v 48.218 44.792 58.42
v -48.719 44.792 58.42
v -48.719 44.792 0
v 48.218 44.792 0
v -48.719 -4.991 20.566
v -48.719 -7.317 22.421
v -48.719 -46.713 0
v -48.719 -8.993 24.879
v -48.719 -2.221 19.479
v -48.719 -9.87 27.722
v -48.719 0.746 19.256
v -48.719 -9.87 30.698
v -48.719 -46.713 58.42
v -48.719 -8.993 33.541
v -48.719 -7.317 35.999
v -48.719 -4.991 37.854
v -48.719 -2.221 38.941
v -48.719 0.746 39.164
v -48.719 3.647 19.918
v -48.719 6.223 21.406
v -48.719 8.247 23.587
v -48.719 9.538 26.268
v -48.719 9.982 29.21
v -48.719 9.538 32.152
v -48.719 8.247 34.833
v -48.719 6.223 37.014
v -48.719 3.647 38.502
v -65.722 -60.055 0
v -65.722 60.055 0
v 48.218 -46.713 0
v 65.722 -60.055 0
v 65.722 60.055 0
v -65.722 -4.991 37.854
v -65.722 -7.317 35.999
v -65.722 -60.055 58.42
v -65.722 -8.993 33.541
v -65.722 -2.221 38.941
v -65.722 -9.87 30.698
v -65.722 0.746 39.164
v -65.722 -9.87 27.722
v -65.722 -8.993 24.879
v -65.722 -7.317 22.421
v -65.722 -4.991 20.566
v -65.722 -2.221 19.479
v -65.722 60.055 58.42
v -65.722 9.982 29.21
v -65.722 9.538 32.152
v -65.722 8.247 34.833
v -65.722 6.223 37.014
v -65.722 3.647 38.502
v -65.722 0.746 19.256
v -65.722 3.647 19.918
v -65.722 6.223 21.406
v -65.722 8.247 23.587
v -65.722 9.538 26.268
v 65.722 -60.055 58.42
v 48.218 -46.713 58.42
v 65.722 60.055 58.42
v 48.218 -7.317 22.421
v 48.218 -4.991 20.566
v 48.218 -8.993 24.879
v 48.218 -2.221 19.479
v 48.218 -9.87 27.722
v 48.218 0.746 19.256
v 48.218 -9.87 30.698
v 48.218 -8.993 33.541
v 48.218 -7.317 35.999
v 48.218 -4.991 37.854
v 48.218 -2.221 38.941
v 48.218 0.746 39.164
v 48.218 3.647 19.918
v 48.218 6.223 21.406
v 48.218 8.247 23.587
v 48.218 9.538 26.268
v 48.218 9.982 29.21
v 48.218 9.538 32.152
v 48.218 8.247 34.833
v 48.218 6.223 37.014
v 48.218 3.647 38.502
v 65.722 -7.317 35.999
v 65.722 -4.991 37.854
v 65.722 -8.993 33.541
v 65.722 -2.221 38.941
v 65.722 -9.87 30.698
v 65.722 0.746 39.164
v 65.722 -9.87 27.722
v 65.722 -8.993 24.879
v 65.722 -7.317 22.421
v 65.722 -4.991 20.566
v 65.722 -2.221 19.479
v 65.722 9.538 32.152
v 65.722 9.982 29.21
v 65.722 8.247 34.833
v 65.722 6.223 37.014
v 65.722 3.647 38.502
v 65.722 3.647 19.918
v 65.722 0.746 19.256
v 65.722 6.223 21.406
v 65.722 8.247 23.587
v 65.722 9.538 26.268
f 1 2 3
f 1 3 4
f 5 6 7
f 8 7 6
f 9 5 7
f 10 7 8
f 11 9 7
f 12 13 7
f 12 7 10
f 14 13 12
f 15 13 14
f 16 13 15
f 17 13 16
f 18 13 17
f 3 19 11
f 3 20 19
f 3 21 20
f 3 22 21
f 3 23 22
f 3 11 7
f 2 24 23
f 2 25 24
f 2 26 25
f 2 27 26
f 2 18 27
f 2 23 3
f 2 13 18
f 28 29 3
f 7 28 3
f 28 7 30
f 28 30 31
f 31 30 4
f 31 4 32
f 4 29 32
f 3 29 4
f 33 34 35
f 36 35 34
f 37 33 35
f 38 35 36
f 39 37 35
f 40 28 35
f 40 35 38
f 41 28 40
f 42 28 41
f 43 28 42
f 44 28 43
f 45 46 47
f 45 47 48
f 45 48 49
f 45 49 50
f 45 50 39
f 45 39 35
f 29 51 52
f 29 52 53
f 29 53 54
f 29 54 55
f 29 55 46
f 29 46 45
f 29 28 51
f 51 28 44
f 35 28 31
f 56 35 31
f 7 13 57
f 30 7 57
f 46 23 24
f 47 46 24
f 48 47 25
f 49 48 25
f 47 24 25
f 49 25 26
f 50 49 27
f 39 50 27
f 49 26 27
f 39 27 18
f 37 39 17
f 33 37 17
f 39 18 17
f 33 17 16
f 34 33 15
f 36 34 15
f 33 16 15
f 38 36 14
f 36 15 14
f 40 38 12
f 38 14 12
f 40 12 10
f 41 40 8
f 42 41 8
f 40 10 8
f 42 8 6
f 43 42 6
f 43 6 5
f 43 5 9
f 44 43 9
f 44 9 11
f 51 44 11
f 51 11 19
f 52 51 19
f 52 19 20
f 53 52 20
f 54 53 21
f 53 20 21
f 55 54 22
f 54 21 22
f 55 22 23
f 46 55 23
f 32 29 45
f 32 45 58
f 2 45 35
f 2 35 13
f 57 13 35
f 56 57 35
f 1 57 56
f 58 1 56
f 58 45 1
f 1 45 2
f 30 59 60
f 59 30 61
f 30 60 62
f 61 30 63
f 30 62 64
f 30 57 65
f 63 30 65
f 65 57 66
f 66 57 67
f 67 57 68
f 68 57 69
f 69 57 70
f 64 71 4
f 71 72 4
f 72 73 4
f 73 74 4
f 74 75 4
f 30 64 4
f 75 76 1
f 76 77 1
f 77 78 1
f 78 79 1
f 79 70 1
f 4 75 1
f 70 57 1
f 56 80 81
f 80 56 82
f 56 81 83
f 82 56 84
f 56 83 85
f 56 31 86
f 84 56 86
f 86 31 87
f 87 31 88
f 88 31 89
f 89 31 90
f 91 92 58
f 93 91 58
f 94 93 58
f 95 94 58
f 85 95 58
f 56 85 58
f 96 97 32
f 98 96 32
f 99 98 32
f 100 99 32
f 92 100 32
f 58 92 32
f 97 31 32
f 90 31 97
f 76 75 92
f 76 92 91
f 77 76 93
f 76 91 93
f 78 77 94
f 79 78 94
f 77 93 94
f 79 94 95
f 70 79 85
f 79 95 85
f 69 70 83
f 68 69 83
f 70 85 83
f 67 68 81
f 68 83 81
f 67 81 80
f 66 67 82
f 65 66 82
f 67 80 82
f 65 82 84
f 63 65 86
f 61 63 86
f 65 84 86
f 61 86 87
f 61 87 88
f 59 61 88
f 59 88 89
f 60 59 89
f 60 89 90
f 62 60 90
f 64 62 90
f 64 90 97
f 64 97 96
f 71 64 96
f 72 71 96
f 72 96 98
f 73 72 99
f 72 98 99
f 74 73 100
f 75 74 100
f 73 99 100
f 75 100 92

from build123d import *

# Parameters (mm, degrees)
F0_W     = 131.444588
F0_H     = 120.110088
F1_DEPTH = 58.42
F2_R     = 9.981672
F4_DEPTH = 157.226
F5_W     = 96.937245
F5_H     = 91.505859
F6_DEPTH = 129.032


with BuildPart() as f1:
    # F0 (on Top) → F1 (new body)
    with BuildSketch(Plane.XY):
        Rectangle(F0_W, F0_H)
    extrude(amount=F1_DEPTH)

    # F2 (on face) → F4 (cut, symmetric)
    with BuildSketch(Plane.YZ.offset(65.722294)):
        with Locations((0, 29.21)):
            Circle(F2_R)
    extrude(amount=F4_DEPTH, both=True, mode=Mode.SUBTRACT)

    # F5 (on Top) → F6 (cut, symmetric)
    with BuildSketch(Plane.XY):
        with Locations((-0.250232, -0.960483)):
            Rectangle(F5_W, F5_H)
    extrude(amount=F6_DEPTH, both=True, mode=Mode.SUBTRACT)


solid = f1.part
